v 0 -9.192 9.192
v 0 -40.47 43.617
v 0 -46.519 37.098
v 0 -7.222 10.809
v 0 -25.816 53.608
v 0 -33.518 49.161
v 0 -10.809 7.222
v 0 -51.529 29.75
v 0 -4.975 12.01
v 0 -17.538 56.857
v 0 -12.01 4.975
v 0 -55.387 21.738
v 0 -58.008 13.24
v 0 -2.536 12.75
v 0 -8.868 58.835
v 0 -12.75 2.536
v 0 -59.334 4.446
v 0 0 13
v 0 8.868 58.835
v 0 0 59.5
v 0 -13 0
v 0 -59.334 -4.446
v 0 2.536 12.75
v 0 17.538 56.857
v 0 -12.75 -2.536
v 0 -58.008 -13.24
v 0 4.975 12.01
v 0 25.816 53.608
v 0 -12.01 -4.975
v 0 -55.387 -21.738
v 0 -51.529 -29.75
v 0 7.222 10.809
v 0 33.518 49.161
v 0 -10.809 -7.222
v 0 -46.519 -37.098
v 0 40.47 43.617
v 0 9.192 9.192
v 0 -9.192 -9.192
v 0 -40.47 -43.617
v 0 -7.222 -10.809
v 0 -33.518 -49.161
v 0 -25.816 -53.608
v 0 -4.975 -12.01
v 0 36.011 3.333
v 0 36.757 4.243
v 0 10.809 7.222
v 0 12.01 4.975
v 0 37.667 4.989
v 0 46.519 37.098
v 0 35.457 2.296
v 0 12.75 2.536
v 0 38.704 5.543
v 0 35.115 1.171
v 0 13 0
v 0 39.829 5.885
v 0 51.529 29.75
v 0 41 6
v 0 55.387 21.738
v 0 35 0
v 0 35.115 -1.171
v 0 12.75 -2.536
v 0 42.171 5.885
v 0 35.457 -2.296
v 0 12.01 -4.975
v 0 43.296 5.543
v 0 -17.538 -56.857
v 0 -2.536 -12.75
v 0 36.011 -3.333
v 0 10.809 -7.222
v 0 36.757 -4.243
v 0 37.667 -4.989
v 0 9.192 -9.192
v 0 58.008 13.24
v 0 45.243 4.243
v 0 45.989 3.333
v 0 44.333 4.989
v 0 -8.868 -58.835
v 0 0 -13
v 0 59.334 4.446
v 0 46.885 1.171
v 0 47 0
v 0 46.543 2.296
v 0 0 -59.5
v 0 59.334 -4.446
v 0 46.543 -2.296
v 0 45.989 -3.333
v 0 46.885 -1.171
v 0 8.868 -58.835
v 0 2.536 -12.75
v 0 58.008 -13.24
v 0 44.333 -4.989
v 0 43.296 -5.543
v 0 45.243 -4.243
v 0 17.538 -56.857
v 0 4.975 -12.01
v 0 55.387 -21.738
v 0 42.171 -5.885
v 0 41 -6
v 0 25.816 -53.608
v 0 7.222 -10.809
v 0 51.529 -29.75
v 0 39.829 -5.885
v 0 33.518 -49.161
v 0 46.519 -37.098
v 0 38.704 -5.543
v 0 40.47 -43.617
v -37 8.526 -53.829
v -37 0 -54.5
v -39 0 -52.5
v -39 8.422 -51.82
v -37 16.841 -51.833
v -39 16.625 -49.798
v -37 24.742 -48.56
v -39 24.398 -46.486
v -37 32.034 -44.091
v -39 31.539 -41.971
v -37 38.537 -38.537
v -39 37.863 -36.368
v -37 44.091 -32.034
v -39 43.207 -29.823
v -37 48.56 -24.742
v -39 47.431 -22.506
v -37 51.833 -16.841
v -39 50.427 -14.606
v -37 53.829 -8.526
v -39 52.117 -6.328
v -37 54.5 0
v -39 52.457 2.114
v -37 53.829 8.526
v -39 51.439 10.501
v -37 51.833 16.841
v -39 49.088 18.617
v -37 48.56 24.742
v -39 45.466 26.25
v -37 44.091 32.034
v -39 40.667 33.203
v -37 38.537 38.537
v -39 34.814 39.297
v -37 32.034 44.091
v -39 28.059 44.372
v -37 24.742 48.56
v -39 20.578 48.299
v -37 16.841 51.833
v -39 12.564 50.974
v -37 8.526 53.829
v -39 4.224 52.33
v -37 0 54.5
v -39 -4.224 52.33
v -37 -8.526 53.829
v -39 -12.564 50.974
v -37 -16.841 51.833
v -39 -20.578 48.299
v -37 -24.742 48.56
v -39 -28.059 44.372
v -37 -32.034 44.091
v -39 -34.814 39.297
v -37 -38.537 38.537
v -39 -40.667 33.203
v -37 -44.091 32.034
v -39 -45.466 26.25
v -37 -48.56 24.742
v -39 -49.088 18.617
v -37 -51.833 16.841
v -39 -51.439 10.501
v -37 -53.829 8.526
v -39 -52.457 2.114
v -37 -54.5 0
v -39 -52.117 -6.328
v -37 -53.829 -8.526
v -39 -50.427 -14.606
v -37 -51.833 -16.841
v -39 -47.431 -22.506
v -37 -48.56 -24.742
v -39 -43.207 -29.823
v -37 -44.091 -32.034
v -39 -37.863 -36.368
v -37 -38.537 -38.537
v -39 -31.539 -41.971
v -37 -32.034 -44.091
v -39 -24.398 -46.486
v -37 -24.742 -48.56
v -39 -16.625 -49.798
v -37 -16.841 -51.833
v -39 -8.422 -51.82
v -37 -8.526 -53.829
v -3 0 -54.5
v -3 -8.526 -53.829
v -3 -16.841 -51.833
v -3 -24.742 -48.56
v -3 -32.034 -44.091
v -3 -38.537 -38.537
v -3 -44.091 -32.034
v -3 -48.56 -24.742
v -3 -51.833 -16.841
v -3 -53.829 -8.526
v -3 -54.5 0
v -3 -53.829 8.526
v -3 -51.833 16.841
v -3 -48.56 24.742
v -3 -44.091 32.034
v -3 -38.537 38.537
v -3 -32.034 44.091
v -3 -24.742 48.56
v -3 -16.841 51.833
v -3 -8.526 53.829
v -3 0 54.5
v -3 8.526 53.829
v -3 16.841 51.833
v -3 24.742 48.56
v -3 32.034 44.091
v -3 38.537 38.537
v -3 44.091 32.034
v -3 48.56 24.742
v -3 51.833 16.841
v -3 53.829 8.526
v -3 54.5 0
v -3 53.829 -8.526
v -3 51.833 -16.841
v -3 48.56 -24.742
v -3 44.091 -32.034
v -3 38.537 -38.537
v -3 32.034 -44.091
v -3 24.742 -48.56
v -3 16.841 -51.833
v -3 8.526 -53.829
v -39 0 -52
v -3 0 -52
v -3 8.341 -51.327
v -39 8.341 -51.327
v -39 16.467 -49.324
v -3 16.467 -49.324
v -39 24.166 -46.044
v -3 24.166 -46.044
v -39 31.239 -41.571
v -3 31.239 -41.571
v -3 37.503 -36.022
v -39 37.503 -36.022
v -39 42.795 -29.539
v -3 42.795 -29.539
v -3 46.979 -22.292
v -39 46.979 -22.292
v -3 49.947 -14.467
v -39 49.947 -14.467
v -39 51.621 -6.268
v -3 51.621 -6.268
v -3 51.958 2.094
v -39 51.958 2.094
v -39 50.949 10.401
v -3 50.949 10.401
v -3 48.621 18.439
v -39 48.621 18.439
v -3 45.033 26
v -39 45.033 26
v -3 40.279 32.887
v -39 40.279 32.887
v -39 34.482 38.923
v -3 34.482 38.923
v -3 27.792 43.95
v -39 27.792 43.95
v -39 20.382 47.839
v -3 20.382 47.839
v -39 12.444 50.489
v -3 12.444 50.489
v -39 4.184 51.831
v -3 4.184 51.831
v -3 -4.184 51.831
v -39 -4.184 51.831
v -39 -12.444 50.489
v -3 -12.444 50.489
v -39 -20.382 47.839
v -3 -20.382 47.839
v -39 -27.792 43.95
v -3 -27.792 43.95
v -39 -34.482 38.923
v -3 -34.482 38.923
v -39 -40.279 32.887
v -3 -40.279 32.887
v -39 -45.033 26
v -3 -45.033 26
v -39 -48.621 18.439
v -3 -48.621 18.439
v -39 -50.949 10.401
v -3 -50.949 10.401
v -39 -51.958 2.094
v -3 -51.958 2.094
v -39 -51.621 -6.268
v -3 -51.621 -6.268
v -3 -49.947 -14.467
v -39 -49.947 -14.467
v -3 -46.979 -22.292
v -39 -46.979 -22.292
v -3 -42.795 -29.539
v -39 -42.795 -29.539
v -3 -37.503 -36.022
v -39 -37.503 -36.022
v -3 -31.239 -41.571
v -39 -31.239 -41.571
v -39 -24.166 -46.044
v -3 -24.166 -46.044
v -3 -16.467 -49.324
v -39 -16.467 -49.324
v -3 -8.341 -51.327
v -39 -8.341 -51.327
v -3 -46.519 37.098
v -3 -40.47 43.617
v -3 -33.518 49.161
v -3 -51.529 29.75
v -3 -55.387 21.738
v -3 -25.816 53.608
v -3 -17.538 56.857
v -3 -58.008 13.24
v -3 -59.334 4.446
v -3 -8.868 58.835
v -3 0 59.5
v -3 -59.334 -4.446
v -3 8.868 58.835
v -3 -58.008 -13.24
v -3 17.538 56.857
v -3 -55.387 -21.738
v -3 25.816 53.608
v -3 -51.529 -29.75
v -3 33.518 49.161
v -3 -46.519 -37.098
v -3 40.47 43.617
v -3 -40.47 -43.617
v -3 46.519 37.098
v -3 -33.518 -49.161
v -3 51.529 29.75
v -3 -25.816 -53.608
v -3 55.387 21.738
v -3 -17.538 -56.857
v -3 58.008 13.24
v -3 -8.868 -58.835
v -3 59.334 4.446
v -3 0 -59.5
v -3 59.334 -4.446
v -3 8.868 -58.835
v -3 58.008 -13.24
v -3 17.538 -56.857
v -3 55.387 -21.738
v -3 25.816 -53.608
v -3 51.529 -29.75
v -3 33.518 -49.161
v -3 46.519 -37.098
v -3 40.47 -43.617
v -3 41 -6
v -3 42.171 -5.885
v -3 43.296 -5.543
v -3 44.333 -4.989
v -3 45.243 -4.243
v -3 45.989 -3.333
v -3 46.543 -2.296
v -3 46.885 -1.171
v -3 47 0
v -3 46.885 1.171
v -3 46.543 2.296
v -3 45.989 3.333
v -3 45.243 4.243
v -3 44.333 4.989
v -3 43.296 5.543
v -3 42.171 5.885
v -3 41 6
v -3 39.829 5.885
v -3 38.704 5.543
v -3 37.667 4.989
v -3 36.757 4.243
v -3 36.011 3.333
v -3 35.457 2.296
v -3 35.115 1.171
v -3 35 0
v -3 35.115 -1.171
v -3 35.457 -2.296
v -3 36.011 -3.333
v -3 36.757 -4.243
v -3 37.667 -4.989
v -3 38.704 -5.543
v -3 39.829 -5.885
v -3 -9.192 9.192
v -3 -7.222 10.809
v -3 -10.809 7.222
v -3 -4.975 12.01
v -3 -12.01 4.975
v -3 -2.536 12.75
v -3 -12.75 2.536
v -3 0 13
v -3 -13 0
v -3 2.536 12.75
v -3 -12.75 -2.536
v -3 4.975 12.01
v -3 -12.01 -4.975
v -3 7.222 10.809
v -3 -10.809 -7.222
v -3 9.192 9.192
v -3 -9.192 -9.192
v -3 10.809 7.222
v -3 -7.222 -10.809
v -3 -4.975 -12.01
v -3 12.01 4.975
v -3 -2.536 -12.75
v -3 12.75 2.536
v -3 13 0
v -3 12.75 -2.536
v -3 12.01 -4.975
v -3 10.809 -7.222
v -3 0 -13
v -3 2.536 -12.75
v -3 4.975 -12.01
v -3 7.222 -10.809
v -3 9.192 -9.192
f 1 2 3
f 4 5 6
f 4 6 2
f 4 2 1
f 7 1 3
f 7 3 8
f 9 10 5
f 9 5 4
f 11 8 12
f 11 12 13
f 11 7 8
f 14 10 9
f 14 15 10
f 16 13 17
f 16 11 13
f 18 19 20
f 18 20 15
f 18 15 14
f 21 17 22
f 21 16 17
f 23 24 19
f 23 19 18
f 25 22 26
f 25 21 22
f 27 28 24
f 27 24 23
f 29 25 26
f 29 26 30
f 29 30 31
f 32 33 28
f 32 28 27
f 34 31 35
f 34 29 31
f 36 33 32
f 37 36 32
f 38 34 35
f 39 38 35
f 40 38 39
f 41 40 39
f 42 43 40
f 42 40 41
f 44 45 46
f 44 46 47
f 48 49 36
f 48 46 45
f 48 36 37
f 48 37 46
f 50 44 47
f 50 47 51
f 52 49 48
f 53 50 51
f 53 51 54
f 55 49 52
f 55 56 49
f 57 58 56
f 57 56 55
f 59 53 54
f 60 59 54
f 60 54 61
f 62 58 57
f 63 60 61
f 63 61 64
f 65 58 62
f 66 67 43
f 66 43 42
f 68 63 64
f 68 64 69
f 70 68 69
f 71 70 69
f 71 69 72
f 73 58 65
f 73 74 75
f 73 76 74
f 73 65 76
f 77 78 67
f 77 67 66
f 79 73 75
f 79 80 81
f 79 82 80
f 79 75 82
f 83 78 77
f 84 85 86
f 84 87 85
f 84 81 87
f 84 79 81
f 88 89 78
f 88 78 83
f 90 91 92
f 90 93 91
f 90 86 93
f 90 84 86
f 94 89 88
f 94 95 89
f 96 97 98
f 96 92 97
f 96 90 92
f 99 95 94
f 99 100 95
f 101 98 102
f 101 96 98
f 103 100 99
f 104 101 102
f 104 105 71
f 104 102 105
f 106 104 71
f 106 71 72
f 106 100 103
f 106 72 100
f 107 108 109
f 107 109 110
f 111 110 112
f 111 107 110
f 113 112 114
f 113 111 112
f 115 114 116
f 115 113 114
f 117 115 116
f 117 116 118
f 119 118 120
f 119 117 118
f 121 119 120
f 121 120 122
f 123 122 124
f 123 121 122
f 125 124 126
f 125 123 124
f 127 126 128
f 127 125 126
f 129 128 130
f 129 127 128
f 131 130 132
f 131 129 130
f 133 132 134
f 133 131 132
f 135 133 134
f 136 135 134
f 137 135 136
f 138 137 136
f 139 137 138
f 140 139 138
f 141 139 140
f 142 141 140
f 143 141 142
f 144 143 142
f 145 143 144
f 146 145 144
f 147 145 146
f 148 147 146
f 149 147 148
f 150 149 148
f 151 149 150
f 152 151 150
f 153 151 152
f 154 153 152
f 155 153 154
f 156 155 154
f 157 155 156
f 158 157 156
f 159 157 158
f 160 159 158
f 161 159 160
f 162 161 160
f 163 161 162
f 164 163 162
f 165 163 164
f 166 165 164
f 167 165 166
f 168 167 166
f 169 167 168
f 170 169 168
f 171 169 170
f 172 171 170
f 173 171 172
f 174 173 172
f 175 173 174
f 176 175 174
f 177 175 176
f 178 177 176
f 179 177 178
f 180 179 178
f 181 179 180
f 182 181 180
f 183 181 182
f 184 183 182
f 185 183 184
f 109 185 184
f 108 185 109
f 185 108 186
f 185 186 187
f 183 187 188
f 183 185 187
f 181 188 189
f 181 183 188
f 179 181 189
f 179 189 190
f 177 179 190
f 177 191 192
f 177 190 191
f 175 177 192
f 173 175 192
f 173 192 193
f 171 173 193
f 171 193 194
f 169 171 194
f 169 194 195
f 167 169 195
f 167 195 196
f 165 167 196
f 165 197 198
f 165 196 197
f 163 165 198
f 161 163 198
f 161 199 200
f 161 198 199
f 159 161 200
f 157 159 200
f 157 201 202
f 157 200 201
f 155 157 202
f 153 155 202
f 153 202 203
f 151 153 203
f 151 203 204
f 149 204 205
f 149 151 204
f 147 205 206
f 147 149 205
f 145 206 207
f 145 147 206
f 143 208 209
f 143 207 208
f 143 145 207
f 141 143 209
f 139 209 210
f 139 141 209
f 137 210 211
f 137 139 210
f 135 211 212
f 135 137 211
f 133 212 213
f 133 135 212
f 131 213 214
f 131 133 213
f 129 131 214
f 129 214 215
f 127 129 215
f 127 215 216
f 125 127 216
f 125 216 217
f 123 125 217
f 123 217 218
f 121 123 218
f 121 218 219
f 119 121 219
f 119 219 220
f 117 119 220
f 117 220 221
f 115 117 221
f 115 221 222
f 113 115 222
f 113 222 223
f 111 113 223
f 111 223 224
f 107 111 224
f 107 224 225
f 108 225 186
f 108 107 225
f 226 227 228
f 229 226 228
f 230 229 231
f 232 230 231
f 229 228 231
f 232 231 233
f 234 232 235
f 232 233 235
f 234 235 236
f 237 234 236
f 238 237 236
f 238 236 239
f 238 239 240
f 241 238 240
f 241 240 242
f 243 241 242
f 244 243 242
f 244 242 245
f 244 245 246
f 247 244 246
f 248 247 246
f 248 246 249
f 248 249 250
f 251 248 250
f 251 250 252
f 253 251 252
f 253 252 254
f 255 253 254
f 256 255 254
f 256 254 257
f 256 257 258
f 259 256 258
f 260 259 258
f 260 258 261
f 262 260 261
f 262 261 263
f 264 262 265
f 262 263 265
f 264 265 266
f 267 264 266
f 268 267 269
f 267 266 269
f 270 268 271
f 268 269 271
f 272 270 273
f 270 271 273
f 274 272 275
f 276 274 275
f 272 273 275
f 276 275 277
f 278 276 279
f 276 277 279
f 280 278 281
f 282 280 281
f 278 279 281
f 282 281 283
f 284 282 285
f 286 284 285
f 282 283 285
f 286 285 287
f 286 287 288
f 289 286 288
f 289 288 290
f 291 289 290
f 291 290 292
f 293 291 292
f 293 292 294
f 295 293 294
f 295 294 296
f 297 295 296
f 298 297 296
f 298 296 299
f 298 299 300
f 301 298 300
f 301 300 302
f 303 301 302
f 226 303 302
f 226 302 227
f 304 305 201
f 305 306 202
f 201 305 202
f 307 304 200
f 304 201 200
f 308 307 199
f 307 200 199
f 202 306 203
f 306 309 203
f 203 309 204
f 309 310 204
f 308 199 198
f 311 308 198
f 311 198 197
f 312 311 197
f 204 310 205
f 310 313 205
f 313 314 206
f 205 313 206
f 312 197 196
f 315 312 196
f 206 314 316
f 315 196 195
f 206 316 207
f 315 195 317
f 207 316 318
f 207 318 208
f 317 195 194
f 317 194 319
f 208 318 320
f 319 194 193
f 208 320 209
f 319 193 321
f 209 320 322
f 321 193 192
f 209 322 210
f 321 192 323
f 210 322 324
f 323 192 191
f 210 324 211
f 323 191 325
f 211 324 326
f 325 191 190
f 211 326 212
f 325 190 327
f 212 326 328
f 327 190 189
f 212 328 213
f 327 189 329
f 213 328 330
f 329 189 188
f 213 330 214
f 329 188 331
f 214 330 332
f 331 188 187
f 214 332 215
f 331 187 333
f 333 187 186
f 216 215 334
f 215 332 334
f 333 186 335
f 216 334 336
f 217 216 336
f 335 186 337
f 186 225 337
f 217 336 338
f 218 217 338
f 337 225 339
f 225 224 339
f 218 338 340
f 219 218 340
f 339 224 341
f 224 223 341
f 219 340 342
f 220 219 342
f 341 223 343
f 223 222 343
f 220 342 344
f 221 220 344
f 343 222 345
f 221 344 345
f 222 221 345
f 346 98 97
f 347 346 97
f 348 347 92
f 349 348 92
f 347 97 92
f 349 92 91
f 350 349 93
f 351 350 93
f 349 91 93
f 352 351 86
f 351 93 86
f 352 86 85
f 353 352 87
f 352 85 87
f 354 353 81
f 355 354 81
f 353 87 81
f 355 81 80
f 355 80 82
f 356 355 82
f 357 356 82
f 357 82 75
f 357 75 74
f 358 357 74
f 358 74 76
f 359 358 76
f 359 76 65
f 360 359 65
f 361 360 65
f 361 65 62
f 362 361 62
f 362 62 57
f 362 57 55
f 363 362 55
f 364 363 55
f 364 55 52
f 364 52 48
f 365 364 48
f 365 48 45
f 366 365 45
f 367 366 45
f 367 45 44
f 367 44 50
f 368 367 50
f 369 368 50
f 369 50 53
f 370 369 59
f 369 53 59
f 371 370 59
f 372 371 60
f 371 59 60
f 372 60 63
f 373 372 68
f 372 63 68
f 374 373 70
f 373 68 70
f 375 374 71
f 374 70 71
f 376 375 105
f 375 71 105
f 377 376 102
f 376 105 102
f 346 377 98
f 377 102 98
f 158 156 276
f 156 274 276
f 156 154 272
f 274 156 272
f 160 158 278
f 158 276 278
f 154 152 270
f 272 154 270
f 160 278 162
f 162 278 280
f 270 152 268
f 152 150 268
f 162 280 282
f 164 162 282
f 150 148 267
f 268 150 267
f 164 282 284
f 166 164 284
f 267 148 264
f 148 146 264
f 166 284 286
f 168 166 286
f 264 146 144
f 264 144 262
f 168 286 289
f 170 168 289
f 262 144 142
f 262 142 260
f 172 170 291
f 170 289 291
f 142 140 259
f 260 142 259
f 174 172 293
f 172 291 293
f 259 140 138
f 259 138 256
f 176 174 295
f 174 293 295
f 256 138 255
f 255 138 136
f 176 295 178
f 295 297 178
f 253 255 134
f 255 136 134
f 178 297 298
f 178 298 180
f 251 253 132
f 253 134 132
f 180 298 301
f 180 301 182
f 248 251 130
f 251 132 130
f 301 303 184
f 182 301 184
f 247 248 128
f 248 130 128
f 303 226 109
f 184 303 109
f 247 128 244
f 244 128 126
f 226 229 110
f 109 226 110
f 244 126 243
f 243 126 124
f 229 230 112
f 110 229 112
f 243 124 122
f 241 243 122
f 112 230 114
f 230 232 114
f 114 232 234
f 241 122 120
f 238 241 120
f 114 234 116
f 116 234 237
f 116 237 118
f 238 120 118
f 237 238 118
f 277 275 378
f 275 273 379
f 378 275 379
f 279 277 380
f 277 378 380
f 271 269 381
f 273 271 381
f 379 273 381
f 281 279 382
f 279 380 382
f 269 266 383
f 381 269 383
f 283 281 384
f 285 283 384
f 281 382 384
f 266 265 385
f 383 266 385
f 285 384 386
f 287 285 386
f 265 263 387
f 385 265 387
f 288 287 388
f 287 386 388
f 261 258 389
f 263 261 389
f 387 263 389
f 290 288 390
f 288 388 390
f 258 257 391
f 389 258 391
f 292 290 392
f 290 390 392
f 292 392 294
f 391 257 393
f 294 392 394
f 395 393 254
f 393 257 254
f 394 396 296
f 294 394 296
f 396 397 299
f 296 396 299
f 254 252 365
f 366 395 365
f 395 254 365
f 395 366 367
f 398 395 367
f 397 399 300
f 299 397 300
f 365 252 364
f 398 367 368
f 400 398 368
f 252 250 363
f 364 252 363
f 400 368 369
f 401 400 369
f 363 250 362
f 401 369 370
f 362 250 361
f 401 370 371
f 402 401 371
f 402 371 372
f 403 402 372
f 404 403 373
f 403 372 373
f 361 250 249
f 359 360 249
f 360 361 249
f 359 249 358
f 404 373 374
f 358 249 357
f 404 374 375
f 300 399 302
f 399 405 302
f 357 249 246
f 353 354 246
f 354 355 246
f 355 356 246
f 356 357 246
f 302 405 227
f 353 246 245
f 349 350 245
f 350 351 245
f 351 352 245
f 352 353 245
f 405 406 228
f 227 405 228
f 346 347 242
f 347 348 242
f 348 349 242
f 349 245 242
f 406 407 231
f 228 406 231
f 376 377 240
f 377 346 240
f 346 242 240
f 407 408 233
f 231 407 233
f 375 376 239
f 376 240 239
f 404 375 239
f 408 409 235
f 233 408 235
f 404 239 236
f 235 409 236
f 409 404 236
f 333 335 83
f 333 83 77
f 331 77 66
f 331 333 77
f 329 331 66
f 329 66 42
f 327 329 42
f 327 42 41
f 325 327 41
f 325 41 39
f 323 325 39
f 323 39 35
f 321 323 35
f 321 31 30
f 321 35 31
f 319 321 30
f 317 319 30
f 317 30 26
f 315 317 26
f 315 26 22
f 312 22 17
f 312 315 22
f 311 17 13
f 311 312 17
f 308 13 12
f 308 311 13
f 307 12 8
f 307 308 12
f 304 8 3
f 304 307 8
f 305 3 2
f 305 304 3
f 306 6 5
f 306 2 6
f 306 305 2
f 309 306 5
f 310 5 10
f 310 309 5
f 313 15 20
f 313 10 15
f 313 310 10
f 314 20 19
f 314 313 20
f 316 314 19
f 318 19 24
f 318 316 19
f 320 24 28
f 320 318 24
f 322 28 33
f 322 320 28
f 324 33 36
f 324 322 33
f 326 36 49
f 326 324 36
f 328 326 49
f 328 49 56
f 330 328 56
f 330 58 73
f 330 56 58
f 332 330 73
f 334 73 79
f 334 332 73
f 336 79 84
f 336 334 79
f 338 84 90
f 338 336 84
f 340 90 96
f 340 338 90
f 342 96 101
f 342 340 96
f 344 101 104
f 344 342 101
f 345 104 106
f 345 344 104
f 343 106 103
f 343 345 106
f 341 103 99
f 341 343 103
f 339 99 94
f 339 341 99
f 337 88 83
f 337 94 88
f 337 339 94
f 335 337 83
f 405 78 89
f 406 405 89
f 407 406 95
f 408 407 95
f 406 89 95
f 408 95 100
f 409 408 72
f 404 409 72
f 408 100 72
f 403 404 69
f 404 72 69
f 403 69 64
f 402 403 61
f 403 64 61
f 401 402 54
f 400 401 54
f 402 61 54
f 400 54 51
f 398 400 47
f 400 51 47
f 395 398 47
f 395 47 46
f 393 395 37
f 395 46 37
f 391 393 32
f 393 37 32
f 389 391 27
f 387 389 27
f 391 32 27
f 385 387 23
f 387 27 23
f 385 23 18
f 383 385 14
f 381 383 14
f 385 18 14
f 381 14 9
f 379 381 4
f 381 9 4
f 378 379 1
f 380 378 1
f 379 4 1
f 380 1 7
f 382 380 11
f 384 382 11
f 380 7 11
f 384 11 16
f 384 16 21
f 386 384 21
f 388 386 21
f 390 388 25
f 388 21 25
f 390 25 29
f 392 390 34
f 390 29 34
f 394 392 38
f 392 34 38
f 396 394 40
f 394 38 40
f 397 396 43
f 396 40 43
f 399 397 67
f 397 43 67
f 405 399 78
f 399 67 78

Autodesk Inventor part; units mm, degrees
ref_plane "YZ Plane" through (0, 0, 0) normal (1, 0, 0) x (0, 1, 0)
ref_plane "XZ Plane" through (0, 0, 0) normal (0, 1, 0) x (-1, 0, 0)
ref_plane "XY Plane" through (0, 0, 0) normal (0, 0, 1) x (1, 0, 0)
sketch "Sketch1" plane through (0, 0, 0) normal (0, 1, 0) x (-1, 0, 0)
  line L0 (0, 0) -> (0, -59.5)
  line L1 (0, -59.5) -> (3, -59.5)
  line L2 (3, -59.5) -> (3, -54.5)
  line L3 (3, -54.5) -> (39, -54.5)
  line L4 (39, -54.5) -> (39, -52)
  line L5 (39, -52) -> (3, -52)
  line L6 (3, -52) -> (3, 0)
  line L7 (3, 0) -> (0, 0)
  dimension "d3" = 3
  dimension "d4" = 5
  dimension "d5" = 36
  dimension "d6" = 2.5
  dimension "d14" = 52
revolve "Revolution1" add sketch "Sketch1" angle 360 about axis through (-3, 0, 0) along (1, 0, 0)
chamfer "Chamfer1" distance 2 angle 45 1 edges at (-39, 0, 54.5)
sketch "Sketch3" plane through (0, 0, 0) normal (1, 0, 0) x (0, 0, -1)
  circle A0 centre (0, 0) radius 13
  circle A1 centre (0, 0) radius 52 construction
  line L0 (0, 0) -> (0, 103.7887) construction
  circle A2 centre (0, 41) radius 6
  point P0 (0, 52)
  dimension "d15" = 26
  dimension "d16" = 12
  dimension "d17" = 11
extrude "holes" cut sketch "Sketch3" against normal blind 10
properties part number "aftPlug" material "PVC-Piping"
